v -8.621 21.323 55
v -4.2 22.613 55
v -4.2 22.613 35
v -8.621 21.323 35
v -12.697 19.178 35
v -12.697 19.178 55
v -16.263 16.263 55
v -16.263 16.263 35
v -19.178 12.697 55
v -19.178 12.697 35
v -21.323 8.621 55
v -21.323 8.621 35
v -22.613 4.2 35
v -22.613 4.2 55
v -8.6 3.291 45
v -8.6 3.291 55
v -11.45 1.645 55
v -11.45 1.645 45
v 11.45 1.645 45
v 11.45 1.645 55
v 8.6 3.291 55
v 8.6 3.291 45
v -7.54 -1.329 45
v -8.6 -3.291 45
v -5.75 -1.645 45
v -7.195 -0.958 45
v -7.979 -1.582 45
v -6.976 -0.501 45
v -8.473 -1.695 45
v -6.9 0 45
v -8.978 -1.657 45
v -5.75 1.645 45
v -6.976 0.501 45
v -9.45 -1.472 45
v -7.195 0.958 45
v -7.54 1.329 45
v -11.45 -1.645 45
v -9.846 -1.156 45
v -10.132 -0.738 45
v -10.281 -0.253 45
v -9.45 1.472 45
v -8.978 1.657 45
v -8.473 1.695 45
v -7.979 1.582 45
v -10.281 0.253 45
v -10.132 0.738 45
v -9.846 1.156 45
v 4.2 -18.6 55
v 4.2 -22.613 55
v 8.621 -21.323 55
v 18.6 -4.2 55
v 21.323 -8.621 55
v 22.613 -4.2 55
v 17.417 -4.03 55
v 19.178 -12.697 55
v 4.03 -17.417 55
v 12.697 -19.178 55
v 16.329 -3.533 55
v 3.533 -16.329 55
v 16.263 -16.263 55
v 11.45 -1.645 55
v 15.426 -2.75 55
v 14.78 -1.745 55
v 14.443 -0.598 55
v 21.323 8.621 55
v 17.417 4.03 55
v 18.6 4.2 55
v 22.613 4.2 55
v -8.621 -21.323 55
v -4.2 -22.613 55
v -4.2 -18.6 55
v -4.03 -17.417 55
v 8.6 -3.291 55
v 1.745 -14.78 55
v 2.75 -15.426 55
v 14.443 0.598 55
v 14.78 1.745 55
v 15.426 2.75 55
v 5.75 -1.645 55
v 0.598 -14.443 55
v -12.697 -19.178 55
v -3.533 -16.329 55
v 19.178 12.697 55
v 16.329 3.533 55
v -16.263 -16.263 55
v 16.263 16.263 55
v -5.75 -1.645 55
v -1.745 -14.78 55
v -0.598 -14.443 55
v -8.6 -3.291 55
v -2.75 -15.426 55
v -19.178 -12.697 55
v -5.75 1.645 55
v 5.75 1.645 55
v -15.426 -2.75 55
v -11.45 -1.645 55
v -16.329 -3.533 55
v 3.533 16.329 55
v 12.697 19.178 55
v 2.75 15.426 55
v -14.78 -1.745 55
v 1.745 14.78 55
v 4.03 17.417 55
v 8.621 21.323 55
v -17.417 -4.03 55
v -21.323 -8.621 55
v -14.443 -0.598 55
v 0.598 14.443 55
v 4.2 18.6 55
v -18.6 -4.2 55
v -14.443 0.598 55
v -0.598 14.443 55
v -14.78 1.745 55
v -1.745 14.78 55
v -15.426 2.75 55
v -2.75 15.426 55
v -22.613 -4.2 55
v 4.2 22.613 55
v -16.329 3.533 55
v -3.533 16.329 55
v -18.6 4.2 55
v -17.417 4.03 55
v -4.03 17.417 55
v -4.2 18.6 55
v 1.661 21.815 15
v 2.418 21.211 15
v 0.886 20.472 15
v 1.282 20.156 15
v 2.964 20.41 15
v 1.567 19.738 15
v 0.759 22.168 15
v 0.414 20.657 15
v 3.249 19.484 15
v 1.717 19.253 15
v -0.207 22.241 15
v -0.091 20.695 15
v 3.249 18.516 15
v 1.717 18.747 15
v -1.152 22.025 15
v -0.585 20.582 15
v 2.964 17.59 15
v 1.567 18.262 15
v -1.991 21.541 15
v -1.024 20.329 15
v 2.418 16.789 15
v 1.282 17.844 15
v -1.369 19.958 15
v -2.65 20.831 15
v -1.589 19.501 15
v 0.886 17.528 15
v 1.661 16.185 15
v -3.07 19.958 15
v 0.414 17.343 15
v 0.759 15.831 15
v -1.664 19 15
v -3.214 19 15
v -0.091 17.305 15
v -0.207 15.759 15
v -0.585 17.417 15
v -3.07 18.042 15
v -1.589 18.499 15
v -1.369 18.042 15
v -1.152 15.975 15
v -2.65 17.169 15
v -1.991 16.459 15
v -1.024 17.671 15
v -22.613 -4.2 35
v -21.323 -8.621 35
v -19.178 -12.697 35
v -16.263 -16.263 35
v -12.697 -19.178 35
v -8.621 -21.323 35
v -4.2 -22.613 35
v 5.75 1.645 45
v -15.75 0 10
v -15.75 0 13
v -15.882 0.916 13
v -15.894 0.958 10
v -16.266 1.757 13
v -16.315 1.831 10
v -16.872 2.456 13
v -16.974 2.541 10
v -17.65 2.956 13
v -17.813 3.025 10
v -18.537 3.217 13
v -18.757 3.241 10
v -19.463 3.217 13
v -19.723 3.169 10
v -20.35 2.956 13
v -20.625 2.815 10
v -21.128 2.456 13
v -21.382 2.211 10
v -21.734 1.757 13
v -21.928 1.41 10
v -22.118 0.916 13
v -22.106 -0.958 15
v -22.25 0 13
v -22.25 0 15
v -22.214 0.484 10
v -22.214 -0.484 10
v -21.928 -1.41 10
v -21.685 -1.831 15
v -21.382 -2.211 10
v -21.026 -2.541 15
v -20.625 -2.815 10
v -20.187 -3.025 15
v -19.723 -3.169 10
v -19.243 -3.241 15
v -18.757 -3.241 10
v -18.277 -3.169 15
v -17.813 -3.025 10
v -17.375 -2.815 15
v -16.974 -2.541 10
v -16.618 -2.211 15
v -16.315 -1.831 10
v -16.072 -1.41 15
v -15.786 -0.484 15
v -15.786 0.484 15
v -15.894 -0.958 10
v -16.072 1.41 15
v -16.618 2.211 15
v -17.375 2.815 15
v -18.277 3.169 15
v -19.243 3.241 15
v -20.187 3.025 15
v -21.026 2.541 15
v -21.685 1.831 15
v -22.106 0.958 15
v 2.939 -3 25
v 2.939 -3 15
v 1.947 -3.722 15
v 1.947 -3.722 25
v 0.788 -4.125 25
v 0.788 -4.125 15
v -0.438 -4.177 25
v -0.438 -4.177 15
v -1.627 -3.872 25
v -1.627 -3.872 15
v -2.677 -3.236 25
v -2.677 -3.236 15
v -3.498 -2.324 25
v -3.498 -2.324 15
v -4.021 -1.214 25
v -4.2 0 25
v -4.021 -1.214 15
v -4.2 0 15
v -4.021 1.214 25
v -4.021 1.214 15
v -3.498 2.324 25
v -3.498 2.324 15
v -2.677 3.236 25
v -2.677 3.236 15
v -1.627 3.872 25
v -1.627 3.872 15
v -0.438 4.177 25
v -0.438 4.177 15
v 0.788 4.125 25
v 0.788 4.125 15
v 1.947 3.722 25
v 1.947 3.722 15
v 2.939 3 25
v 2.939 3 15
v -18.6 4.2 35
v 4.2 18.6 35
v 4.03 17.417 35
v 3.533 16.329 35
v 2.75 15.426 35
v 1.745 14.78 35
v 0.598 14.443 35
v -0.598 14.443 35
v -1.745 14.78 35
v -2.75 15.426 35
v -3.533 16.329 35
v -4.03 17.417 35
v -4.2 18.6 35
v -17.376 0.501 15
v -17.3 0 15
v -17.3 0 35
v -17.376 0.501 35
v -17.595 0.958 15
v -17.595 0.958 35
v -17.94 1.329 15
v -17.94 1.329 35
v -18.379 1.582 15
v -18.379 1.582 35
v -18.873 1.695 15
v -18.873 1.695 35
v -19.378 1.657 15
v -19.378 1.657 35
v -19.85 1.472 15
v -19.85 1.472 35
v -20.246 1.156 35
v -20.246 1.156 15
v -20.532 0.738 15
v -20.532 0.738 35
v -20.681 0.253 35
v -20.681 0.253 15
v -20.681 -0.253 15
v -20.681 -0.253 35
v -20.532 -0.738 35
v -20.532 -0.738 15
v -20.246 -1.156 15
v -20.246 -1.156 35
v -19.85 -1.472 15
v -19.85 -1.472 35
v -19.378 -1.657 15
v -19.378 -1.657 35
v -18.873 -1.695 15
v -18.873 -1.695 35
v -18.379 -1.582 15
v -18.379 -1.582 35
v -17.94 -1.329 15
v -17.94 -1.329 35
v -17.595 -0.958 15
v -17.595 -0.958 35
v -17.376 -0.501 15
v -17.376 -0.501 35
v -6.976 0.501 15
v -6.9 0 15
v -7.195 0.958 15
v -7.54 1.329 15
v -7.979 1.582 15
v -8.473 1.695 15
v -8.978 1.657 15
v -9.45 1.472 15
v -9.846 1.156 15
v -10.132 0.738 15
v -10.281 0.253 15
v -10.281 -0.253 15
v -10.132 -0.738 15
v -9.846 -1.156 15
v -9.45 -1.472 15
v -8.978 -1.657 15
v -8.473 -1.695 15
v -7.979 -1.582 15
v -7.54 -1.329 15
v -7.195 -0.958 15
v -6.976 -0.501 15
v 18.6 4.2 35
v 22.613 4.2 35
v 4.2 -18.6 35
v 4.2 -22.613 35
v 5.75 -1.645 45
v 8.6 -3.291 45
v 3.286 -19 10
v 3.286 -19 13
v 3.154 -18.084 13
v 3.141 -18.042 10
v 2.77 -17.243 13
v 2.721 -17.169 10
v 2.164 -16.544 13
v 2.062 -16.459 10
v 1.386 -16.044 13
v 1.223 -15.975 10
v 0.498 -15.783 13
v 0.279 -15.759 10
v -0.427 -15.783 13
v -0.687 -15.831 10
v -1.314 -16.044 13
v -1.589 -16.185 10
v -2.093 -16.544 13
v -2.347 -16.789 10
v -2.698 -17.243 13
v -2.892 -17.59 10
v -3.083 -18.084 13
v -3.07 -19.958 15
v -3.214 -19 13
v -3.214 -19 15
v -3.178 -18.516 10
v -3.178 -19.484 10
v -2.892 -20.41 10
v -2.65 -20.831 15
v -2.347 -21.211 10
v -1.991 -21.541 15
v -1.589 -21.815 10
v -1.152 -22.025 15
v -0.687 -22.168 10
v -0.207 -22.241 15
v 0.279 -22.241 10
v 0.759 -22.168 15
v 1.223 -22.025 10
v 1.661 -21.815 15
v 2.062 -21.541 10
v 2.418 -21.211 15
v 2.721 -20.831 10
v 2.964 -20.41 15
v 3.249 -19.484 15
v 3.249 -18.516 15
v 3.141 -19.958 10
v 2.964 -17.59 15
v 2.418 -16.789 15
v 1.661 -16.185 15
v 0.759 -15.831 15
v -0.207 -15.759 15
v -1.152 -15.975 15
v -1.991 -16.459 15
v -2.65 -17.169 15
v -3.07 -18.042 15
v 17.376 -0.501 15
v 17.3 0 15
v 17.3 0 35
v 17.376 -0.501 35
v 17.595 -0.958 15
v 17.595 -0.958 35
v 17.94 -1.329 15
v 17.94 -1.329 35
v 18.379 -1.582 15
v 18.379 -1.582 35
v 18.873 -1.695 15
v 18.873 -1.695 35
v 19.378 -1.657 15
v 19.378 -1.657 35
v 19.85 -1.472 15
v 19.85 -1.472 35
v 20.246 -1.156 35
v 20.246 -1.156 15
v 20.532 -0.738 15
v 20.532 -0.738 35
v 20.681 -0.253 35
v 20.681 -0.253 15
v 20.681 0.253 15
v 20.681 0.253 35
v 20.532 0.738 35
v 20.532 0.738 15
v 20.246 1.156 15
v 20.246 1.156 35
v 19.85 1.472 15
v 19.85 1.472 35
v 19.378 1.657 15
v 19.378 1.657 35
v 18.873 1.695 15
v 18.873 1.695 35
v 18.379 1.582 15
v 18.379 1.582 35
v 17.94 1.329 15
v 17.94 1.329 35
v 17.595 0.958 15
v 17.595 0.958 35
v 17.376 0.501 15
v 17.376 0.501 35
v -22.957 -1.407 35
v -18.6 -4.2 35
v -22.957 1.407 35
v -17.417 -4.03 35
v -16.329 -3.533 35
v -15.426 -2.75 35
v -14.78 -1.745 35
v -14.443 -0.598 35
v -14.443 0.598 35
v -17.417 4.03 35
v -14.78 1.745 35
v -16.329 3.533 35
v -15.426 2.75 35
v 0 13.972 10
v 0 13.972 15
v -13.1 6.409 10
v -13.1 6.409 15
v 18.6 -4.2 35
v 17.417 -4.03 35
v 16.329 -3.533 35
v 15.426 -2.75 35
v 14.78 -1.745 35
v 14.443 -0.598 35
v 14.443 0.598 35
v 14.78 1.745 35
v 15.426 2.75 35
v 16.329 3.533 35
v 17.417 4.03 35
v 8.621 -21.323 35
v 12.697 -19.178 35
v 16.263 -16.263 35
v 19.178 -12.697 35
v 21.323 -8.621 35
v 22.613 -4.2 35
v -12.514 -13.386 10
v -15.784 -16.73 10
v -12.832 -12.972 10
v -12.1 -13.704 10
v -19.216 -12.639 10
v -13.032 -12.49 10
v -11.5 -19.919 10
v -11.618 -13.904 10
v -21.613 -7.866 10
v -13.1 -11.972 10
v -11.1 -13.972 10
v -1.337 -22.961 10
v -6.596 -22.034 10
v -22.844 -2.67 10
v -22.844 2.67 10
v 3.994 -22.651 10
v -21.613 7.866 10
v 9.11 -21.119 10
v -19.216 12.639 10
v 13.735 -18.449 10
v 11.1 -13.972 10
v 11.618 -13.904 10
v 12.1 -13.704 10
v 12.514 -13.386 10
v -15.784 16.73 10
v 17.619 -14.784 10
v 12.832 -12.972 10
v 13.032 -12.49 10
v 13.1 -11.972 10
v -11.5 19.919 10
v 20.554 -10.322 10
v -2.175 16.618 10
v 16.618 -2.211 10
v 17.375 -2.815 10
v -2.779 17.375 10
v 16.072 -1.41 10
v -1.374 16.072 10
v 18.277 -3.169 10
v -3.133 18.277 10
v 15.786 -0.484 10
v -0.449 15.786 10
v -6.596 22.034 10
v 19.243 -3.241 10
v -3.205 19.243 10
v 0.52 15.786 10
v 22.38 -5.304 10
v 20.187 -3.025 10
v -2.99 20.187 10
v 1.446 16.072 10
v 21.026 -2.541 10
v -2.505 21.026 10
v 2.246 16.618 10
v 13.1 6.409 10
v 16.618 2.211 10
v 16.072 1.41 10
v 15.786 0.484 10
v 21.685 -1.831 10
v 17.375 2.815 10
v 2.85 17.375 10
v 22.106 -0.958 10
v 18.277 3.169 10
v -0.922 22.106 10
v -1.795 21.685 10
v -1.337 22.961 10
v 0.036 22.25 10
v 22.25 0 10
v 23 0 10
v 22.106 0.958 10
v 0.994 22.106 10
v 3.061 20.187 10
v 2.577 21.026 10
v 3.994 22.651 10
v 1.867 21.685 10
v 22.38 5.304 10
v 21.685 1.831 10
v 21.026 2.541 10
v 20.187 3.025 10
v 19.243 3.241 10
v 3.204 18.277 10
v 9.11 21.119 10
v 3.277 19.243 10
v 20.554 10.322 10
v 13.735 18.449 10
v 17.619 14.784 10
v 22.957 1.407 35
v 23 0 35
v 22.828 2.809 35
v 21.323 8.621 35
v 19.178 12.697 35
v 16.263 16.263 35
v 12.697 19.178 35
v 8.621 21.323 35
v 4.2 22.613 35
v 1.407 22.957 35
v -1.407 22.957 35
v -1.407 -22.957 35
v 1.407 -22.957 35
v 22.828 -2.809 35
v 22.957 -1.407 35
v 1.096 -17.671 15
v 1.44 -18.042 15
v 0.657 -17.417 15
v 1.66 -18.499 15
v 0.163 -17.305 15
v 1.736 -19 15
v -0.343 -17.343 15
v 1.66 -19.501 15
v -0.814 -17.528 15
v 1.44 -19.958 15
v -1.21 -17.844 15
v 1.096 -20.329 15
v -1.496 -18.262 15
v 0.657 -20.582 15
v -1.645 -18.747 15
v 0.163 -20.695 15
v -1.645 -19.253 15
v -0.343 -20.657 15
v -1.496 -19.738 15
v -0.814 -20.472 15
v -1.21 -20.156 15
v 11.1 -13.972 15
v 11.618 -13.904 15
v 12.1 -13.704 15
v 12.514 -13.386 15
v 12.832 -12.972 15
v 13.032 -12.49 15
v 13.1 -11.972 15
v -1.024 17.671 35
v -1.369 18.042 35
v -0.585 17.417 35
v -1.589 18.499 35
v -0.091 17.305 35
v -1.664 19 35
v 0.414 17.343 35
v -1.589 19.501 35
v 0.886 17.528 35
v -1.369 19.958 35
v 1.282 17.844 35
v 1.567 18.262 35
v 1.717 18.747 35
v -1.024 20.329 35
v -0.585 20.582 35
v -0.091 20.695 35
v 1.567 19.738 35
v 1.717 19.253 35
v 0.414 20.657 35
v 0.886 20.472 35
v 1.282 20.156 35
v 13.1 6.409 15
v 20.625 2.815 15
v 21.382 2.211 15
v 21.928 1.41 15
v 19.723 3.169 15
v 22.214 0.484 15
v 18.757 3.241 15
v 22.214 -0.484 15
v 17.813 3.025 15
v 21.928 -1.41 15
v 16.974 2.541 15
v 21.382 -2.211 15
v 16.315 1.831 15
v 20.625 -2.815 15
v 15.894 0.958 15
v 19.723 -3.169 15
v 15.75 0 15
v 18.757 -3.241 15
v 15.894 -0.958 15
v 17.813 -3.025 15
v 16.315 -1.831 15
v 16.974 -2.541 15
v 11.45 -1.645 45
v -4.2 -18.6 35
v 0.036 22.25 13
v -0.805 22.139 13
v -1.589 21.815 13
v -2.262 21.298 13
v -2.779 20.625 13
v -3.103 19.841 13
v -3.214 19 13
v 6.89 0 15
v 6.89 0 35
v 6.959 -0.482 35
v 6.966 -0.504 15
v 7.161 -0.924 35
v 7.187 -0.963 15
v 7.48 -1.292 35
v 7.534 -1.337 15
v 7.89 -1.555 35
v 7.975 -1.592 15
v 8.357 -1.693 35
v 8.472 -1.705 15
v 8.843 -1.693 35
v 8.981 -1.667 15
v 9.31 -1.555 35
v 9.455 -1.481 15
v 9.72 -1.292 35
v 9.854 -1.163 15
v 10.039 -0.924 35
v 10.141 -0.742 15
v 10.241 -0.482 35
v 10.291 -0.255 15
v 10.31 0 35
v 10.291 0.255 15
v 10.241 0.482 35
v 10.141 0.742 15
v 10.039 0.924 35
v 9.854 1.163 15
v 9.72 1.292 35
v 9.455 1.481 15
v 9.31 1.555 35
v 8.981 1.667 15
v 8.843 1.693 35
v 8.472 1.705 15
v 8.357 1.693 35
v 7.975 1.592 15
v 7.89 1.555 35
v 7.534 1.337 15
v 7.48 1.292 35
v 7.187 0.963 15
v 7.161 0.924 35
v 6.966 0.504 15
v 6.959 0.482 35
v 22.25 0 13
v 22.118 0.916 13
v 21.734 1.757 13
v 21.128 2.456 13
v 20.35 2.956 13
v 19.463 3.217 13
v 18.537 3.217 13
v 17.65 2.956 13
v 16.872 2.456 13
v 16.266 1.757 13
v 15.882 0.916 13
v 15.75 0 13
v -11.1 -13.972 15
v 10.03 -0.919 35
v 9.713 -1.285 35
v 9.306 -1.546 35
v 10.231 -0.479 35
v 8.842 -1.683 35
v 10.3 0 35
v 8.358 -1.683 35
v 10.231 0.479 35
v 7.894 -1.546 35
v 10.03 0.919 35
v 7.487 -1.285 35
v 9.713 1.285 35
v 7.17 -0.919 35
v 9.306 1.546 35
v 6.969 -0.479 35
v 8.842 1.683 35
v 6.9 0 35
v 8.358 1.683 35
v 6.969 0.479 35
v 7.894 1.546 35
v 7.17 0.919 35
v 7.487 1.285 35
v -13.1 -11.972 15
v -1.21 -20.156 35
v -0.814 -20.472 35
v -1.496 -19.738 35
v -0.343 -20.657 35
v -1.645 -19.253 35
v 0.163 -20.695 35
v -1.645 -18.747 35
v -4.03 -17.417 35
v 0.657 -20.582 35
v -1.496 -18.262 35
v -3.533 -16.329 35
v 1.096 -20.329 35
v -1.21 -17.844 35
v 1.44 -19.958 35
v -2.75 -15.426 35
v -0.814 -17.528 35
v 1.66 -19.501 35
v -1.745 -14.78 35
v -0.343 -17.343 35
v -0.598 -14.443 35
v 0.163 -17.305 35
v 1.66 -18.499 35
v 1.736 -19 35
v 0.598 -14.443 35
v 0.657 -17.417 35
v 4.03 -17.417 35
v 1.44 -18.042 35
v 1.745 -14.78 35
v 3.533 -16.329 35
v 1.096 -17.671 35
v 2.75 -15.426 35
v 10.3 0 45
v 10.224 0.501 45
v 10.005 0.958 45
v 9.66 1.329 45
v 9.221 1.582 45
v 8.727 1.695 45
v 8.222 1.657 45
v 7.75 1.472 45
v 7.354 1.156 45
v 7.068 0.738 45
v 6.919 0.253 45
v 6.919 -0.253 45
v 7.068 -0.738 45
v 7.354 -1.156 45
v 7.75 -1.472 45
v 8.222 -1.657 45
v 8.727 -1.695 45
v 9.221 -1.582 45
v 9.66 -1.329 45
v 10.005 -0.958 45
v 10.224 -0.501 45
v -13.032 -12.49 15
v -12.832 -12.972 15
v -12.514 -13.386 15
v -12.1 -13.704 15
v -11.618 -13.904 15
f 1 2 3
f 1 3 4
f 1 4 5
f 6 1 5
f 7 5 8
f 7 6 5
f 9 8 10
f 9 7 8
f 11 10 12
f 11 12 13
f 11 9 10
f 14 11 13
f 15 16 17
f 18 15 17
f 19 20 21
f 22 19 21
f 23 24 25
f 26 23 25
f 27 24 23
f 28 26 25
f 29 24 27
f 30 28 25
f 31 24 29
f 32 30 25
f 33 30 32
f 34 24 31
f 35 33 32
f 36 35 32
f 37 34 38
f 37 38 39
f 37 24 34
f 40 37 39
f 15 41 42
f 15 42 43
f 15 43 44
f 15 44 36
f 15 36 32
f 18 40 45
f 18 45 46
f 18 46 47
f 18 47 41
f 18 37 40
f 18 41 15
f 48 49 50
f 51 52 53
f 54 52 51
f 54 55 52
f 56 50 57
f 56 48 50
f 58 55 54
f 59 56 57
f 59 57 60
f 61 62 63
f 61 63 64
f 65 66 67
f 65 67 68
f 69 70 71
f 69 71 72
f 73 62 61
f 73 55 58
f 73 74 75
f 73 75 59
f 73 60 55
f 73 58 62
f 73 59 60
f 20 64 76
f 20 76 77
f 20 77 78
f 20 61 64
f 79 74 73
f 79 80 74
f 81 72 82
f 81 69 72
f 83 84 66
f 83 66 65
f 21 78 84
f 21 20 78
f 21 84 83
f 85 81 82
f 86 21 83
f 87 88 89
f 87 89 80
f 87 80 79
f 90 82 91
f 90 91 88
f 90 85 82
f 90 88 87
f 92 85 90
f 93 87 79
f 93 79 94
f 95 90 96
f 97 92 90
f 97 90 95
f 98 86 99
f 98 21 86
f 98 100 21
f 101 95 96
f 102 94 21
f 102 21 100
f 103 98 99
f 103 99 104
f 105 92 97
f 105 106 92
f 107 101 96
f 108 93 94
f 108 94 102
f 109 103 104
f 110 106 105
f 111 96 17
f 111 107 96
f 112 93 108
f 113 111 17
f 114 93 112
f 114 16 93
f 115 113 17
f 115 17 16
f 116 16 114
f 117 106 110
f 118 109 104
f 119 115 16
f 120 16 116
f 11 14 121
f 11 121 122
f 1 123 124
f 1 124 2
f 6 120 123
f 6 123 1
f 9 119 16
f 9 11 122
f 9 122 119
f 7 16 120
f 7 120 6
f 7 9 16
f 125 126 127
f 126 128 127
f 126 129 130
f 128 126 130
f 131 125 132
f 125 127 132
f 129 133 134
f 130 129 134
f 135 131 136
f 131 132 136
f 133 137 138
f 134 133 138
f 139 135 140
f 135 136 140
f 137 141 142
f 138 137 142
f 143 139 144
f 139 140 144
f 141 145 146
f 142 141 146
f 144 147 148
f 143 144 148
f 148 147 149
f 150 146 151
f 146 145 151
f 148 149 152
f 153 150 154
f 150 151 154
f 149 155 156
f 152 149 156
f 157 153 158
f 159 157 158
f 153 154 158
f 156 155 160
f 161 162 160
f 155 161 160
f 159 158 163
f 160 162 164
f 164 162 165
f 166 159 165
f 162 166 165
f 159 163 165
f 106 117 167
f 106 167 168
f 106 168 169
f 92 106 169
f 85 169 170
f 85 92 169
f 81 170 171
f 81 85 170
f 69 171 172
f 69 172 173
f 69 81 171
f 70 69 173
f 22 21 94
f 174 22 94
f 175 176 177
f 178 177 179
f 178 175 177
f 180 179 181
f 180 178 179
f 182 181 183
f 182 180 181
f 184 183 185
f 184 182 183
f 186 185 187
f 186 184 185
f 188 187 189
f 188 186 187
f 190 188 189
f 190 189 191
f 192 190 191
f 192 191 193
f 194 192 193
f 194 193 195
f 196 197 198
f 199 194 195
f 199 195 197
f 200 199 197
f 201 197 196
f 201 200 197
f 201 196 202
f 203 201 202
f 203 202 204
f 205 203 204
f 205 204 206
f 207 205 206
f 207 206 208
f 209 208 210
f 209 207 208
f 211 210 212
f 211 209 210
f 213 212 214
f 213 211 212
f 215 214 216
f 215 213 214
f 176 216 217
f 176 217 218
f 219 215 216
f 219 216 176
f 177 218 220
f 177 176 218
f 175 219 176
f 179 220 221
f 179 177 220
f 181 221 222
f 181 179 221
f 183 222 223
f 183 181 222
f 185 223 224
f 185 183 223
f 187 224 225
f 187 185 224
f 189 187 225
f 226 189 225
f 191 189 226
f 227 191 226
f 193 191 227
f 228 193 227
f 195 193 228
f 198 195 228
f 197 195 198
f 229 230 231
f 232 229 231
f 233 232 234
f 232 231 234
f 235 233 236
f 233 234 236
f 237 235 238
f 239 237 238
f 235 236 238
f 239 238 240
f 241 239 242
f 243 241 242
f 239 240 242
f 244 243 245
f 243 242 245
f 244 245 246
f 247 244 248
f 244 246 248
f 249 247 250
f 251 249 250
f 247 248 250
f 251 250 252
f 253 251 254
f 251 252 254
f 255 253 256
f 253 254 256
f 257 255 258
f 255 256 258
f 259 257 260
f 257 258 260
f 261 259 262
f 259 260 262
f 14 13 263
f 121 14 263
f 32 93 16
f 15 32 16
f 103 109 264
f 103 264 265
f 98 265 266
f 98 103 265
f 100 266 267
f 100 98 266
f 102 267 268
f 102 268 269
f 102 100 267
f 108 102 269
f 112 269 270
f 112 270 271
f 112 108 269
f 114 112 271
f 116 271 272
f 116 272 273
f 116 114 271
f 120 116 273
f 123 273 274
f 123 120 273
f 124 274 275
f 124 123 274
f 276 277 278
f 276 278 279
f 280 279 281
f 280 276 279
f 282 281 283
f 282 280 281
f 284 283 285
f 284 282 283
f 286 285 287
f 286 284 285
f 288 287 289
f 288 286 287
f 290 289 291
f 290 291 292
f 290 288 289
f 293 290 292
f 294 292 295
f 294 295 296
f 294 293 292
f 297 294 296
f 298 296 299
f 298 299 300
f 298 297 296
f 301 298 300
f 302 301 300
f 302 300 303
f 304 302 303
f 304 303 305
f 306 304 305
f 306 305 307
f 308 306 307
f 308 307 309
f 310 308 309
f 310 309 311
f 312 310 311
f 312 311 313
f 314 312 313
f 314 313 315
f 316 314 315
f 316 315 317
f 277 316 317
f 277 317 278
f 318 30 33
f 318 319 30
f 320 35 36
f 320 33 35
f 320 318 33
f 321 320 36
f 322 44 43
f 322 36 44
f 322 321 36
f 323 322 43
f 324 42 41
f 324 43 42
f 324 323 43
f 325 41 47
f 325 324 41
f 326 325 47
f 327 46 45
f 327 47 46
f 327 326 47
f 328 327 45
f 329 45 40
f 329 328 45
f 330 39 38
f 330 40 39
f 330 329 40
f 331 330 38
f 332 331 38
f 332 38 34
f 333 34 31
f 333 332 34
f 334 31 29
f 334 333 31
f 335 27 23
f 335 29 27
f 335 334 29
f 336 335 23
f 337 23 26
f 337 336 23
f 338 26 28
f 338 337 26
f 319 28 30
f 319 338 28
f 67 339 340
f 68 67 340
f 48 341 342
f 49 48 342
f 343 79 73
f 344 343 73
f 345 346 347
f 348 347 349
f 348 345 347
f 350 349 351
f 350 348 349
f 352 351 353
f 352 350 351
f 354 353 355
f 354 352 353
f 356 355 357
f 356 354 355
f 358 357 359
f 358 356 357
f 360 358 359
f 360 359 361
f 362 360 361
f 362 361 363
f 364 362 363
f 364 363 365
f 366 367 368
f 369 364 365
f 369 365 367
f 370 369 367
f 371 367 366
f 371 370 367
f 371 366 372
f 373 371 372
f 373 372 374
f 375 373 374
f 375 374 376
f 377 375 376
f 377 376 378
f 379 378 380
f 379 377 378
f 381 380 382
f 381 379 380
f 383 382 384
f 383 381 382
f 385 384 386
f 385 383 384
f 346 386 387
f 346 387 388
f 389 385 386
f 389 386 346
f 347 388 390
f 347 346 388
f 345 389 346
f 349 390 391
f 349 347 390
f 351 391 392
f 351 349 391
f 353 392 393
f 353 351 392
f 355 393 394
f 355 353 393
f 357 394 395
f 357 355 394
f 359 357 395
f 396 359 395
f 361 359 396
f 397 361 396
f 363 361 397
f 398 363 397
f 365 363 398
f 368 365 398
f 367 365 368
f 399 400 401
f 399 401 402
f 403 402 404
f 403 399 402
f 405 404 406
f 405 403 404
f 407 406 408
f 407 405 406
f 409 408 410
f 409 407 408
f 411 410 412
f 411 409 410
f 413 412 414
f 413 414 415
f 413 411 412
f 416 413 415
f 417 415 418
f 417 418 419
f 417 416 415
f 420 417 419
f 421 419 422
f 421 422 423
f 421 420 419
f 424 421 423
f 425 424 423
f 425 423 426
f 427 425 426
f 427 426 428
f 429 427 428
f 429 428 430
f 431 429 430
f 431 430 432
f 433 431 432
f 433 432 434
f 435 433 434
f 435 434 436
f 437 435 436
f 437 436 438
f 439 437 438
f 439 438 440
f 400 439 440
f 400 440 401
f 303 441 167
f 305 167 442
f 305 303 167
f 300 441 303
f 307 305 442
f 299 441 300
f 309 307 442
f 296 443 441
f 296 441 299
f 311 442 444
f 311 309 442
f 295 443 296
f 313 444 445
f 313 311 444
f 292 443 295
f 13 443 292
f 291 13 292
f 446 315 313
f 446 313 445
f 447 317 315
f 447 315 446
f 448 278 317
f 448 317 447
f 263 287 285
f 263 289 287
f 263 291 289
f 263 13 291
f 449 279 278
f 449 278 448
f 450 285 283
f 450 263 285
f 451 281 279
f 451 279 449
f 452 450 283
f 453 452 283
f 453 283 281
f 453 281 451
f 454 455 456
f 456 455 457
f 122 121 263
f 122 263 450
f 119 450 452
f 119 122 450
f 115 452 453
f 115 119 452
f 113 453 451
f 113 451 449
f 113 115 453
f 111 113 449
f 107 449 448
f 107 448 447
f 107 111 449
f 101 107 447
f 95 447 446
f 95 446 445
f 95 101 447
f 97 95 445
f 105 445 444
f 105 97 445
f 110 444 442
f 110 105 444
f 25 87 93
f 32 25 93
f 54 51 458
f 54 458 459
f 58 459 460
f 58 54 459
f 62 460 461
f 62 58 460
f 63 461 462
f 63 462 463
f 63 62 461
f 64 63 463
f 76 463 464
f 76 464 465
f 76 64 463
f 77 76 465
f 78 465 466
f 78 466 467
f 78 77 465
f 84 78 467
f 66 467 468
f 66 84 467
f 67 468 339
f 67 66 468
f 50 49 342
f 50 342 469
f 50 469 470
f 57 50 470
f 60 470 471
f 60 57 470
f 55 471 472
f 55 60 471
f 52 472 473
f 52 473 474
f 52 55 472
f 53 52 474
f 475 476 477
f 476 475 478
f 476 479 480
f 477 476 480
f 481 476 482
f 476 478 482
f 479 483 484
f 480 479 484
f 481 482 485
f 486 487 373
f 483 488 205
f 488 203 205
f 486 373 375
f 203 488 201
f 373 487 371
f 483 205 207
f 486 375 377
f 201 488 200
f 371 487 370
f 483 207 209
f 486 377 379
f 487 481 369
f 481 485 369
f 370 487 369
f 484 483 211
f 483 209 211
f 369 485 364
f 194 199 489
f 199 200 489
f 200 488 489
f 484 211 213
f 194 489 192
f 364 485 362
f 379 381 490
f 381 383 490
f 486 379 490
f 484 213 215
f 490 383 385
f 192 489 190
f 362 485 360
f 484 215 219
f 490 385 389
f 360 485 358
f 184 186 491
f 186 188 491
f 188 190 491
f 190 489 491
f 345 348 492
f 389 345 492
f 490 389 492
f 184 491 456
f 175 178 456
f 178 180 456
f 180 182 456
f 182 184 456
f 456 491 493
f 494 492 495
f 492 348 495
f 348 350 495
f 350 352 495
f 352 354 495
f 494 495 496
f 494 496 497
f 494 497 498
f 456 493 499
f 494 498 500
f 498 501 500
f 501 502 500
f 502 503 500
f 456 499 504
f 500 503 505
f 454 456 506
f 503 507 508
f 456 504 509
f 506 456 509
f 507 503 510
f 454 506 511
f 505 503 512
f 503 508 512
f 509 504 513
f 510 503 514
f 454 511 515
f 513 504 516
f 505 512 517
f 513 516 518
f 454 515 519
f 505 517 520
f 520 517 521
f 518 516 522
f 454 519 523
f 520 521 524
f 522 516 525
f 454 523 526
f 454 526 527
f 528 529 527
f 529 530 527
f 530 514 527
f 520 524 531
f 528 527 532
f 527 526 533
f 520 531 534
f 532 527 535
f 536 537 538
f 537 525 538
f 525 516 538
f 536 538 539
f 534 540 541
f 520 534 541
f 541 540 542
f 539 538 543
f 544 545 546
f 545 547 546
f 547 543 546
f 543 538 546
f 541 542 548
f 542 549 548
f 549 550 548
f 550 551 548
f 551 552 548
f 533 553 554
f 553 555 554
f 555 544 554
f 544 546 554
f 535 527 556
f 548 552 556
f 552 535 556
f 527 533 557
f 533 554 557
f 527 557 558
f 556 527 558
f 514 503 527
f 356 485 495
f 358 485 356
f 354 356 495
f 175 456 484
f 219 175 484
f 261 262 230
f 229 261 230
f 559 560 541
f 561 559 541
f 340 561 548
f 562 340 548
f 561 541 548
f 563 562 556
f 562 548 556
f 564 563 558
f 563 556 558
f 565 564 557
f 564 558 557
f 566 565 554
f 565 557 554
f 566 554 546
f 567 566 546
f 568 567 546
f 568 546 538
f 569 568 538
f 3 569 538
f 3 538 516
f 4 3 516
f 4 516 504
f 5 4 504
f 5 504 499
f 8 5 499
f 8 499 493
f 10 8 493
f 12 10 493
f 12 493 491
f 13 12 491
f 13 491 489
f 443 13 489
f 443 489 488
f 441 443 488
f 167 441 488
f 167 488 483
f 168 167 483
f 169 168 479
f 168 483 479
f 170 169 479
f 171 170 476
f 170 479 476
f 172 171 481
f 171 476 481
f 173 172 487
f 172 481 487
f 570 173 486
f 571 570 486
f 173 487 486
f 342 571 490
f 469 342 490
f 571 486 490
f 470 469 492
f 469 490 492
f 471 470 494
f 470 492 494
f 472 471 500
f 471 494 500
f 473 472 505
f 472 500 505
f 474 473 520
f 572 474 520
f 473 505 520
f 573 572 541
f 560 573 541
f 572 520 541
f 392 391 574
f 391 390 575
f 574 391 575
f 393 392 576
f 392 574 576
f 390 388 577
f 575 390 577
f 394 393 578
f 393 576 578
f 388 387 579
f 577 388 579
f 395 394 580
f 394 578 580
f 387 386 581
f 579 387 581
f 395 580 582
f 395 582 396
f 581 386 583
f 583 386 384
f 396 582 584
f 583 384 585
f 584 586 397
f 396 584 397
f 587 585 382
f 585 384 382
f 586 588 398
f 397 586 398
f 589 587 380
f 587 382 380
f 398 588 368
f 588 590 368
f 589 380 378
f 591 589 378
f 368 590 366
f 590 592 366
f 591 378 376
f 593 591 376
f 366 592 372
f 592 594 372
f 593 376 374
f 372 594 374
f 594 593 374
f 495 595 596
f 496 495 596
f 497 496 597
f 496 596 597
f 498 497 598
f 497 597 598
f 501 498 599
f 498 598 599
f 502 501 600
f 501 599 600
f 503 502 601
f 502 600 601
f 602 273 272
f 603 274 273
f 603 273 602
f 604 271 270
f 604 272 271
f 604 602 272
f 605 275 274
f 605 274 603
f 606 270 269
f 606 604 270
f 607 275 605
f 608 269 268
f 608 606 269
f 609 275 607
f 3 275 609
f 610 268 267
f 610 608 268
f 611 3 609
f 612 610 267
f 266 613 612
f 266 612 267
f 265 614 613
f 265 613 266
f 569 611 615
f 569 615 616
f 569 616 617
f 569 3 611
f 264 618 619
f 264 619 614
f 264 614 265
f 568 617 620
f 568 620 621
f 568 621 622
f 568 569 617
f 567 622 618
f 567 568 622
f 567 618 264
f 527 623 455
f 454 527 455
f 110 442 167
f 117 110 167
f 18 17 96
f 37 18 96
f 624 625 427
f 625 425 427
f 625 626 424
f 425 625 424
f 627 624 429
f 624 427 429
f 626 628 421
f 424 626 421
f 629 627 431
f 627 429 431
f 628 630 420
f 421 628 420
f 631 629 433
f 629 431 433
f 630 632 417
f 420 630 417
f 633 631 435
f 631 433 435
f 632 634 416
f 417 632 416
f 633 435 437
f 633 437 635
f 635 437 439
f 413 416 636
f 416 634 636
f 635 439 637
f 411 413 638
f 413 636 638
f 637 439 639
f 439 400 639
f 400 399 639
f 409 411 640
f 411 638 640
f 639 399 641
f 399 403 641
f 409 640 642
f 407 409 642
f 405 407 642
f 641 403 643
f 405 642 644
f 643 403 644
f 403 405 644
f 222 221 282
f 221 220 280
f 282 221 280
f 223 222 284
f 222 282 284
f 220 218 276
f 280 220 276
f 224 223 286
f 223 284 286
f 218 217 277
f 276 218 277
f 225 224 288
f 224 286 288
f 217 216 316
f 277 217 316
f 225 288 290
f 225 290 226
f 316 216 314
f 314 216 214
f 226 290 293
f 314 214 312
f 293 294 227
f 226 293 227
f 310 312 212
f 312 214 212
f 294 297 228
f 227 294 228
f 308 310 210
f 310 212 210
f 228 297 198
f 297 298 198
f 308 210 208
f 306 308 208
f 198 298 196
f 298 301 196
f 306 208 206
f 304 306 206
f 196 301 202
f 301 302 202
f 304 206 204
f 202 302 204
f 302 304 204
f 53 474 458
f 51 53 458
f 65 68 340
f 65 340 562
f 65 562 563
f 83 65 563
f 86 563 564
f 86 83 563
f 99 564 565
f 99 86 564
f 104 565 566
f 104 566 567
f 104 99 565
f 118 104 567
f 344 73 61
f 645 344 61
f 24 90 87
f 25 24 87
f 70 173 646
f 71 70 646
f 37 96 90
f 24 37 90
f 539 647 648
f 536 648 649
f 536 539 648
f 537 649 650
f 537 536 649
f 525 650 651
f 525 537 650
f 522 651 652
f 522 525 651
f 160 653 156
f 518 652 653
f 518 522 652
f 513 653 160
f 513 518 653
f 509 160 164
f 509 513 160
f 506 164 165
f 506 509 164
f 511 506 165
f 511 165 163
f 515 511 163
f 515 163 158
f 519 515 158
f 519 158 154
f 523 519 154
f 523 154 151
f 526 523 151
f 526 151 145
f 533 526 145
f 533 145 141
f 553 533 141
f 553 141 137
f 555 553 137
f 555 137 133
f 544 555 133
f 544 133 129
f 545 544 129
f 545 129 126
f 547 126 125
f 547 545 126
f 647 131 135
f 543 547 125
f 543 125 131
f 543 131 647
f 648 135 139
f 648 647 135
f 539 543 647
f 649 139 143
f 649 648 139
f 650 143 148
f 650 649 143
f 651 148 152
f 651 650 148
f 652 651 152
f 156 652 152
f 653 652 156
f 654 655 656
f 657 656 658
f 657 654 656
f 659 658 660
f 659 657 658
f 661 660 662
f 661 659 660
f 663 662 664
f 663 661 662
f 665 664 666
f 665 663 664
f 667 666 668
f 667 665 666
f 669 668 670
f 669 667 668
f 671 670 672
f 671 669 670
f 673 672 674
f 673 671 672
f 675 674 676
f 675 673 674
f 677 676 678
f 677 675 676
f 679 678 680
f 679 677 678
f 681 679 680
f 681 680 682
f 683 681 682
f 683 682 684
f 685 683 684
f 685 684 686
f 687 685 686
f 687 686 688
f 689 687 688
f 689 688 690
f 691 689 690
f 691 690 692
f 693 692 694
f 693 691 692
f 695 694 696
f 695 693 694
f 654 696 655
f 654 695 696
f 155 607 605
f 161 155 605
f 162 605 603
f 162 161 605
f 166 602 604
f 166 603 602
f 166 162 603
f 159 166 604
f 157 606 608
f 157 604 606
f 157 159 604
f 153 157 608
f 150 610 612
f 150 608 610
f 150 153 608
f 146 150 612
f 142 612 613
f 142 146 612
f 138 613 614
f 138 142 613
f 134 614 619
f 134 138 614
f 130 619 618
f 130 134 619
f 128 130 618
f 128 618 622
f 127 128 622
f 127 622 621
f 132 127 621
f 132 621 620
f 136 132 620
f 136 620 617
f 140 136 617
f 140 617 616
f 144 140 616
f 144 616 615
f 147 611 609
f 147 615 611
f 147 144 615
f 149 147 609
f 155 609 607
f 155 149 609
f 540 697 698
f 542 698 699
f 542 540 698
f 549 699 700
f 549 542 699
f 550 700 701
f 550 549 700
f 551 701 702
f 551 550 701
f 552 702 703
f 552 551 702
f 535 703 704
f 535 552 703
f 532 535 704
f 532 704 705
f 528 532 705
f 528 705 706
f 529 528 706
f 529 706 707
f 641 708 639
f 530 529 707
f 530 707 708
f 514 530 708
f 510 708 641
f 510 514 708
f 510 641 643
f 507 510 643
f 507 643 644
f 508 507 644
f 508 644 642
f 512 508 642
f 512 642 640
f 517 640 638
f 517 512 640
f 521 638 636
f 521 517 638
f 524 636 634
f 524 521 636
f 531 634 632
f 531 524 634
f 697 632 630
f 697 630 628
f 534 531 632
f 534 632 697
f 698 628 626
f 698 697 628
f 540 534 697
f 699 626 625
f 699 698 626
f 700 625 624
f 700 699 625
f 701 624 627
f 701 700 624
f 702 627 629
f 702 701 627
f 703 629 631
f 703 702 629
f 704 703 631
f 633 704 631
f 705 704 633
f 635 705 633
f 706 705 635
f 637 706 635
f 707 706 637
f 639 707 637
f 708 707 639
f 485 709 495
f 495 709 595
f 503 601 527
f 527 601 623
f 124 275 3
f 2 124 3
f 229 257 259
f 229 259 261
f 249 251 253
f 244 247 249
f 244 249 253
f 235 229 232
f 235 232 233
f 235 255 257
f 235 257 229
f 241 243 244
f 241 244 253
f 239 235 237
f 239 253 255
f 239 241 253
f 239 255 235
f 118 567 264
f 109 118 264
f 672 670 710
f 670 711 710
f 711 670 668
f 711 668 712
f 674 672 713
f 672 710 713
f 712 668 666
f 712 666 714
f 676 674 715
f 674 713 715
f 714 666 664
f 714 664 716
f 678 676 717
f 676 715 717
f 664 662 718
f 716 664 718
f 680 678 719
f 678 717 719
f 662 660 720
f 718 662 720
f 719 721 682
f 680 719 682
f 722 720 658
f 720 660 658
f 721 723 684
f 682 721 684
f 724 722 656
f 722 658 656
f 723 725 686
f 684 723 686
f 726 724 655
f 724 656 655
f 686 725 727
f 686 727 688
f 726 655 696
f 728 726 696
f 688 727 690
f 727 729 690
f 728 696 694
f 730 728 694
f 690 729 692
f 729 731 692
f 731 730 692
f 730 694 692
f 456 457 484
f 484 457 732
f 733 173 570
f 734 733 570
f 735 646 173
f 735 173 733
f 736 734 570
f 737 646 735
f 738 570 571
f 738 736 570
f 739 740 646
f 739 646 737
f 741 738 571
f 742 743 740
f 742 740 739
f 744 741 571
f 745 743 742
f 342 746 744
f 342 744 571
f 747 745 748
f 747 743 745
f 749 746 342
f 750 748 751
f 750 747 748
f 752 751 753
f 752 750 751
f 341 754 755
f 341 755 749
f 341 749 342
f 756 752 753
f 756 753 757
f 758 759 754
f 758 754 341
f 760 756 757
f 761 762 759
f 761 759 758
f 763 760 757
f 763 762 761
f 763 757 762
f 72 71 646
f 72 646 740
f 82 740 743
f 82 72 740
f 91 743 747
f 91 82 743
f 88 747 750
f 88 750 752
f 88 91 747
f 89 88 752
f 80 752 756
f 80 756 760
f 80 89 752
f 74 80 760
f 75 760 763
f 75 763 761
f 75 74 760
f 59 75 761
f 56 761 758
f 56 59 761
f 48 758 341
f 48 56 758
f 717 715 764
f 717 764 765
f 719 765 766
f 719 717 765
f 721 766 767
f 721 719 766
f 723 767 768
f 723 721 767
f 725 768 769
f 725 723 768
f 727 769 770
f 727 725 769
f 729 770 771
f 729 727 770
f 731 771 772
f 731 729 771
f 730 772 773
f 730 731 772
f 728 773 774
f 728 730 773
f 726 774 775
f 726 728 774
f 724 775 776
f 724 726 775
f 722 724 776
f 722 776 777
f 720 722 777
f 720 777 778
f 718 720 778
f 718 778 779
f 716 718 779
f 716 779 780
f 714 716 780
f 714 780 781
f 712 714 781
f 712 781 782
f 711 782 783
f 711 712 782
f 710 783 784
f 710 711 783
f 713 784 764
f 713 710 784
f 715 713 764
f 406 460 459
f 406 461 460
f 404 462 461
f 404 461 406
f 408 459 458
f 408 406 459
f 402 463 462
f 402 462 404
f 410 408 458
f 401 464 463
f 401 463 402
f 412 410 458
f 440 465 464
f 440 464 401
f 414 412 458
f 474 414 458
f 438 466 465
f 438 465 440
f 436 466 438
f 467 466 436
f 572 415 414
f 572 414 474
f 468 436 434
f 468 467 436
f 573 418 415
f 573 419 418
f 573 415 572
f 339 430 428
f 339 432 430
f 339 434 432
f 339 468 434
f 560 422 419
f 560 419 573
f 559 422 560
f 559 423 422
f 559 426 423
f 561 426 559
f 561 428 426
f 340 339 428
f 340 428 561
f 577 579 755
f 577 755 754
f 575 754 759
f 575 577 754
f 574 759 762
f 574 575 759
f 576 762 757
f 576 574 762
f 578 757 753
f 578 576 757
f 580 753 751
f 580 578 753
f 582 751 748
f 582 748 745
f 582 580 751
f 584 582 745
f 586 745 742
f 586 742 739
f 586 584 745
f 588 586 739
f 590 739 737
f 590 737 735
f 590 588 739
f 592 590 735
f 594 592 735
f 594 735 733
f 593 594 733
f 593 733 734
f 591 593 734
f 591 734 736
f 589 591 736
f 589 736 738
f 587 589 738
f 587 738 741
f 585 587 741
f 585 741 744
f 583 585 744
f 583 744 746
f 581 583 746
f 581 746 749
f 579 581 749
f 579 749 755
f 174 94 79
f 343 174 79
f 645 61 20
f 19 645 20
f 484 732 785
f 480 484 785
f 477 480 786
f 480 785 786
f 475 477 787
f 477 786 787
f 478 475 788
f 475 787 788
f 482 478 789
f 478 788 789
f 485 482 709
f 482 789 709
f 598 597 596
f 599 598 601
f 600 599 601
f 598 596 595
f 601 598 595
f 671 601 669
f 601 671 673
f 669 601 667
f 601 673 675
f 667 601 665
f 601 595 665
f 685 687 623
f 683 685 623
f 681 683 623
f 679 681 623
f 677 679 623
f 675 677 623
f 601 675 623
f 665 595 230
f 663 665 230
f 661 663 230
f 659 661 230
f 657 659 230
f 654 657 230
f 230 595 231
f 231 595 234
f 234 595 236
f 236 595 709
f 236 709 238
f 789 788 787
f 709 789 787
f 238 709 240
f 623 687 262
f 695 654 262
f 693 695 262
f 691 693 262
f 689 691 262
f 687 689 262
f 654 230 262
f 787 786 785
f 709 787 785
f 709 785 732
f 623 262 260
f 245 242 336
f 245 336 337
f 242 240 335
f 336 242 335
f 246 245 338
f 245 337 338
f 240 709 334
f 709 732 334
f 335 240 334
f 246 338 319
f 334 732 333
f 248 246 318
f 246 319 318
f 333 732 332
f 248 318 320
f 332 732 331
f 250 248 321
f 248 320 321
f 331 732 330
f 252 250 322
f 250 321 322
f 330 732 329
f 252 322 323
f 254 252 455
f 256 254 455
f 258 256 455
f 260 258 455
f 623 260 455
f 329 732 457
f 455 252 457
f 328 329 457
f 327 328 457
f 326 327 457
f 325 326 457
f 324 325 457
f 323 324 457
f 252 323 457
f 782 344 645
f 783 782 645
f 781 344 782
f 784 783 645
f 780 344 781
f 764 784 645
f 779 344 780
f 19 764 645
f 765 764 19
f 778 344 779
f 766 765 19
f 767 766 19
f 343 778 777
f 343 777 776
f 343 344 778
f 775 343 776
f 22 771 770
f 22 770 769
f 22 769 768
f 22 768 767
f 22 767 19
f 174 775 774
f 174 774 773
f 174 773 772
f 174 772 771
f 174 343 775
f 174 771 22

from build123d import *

# Parameters (mm, degrees)
BOSS_EXTRUDE1_OUTLINE_R    = 16
BOSS_EXTRUDE1_DEPTH        = 15
SKETCH2_W                  = 7.4
SKETCH2_H                  = 24.742483552
CUT_EXTRUDE1_DEPTH         = 16.8
SKETCH3_R                  = 1.71
CUT_EXTRUDE2_DEPTH         = 70
BOSS_EXTRUDE2_DEPTH        = 20
BOSS_EXTRUDE2_DEPTH_BACK   = 5
SKETCH10_R                 = 23
SKETCH10_R_2               = 1.7
CUT_EXTRUDE4_DEPTH         = 25
SKETCH3_11_R               = 1.71
CUT_EXTRUDE5_DEPTH         = 55
CUT_EXTRUDE6_DEPTH         = 2.3
CUT_EXTRUDE6_DEPTH_BACK    = 0.7
SKETCH14_R                 = 12.3
BOSS_EXTRUDE3_START        = 20
BOSS_EXTRUDE3_DEPTH        = 20
SKETCH19_R                 = 16.2
CUT_EXTRUDE7_DEPTH         = 2.2
CUT_EXTRUDE8_START         = 35
CUT_EXTRUDE8_OUTLINE_R     = 1.7
CUT_EXTRUDE8_DEPTH         = 20
CUT_EXTRUDE9_START         = 2
CUT_EXTRUDE9_OUTLINE_R     = 16
CUT_EXTRUDE9_OUTLINE_R_2   = 15.484452344
CUT_EXTRUDE9_DEPTH         = 8
CUT_EXTRUDE9_START_2       = 10
CUT_EXTRUDE9_2_OUTLINE_R   = 3.25
CUT_EXTRUDE9_2_OUTLINE_R_2 = 1.7
CUT_EXTRUDE9_2_DEPTH       = 3
CUT_EXTRUDE10_DEPTH        = 3.6
SKETCH36_R                 = 15.484452344
CUT_EXTRUDE11_DEPTH        = 8
CUT_EXTRUDE13_DEPTH        = 5
CUT_EXTRUDE14_DEPTH        = 10
SKETCH39_R                 = 3.25
CUT_EXTRUDE15_DEPTH        = 5


# Read off the part's stored shape, not the designer's step: Boss-Extrude1, Cut-Extrude8, Cut-Extrude9
with BuildPart() as part:
    # Boss-Extrude1 outline → Boss-Extrude1 (new body)
    with BuildSketch(Plane(origin=(0, 0, 0), x_dir=(0, 1, 0), z_dir=(0, 0, 1))):
        Circle(BOSS_EXTRUDE1_OUTLINE_R)
    extrude(amount=BOSS_EXTRUDE1_DEPTH)

    # Sketch2 → Cut-Extrude1 (cut)
    with BuildSketch(Plane.ZY.offset(16)):
        with Locations((10.1, 0)):
            Rectangle(SKETCH2_W, SKETCH2_H)
    extrude(amount=-CUT_EXTRUDE1_DEPTH, mode=Mode.SUBTRACT)

    # Sketch3 → Cut-Extrude2 (cut)
    with BuildSketch(Plane(origin=(0, 0, 0), x_dir=(0, 1, 0), z_dir=(0, 0, 1))):
        with Locations((0, 8.6)):
            Circle(SKETCH3_R)
    extrude(amount=CUT_EXTRUDE2_DEPTH, mode=Mode.SUBTRACT)

    # Sketch10 → Boss-Extrude2 (add, two sides: drawn at the far end of the back side and taken through both)
    with BuildSketch(Plane(origin=(0, 0, 15), x_dir=(0, 1, 0), z_dir=(0, 0, 1)).offset(-BOSS_EXTRUDE2_DEPTH_BACK)):
        with Locations(Location((0, 0, 0), (0, 0, 270))):
            Circle(SKETCH10_R)
        with Locations(Location((0, 8.6, 0), (0, 0, 270))):
            Circle(SKETCH10_R_2, mode=Mode.SUBTRACT)
        with Locations(Location((0, 19, 0), (0, 0, 270))):
            Circle(SKETCH10_R_2, mode=Mode.SUBTRACT)
        with Locations(Location((18.999966339, -0.035764812, 0), (0, 0, 90))):
            Circle(SKETCH10_R_2, mode=Mode.SUBTRACT)
        with Locations(Location((0, -19, 0), (0, 0, 90))):
            Circle(SKETCH10_R_2, mode=Mode.SUBTRACT)
        with Locations(Location((-18.999966339, -0.035764812, 0), (0, 0, 270))):
            Circle(SKETCH10_R_2, mode=Mode.SUBTRACT)
        with Locations(Location((0, -8.6, 0), (0, 0, 270))):
            Circle(SKETCH10_R_2, mode=Mode.SUBTRACT)
    extrude(amount=BOSS_EXTRUDE2_DEPTH + BOSS_EXTRUDE2_DEPTH_BACK)

    # Sketch3<6> → Cut-Extrude4 (cut)
    with BuildSketch(Plane(origin=(0, 0, 0), x_dir=(0, 1, 0), z_dir=(0, 0, 1))):
        with BuildLine():
            Line((3, -2.939387691), (-3, -2.939387691))
            ThreePointArc((-3, -2.939387691), (0, 4.2), (3, -2.939387691))
        make_face()
    extrude(amount=CUT_EXTRUDE4_DEPTH, mode=Mode.SUBTRACT)

    # Sketch3<11> → Cut-Extrude5 (cut)
    with BuildSketch(Plane(origin=(0, 0, 0), x_dir=(0, 1, 0), z_dir=(0, 0, 1))):
        with Locations(Location((0, -8.6, 0), (0, 0, 90))):
            Circle(SKETCH3_11_R)
    extrude(amount=CUT_EXTRUDE5_DEPTH, mode=Mode.SUBTRACT)

    # Sketch14 → Cut-Extrude6 (cut, two sides: drawn at the far end of the back side and taken through both)
    with BuildSketch(Plane(origin=(0, 0, 7.5), x_dir=(0, 1, 0), z_dir=(0, 0, 1)).offset(-CUT_EXTRUDE6_DEPTH_BACK)):
        Circle(SKETCH14_R)
    extrude(amount=CUT_EXTRUDE6_DEPTH + CUT_EXTRUDE6_DEPTH_BACK, mode=Mode.SUBTRACT)

    # Sketch15 → Boss-Extrude3 (add)
    with BuildSketch(Plane(origin=(0, 0, 35), x_dir=(0, 1, 0), z_dir=(0, 0, 1)).offset(BOSS_EXTRUDE3_START)):
        with BuildLine():
            Line((-4.2, 18.6), (-4.2, 22.61327044))
            ThreePointArc((-4.2, 22.61327044), (-16.263455967, 16.263455967), (-22.61327044, 4.2))
            Line((-22.61327044, 4.2), (-18.6, 4.2))
            ThreePointArc((-18.6, 4.2), (-14.4, 0), (-18.6, -4.2))
            Line((-18.6, -4.2), (-22.61327044, -4.2))
            ThreePointArc((-22.61327044, -4.2), (-16.263455967, -16.263455967), (-4.2, -22.61327044))
            Line((-4.2, -22.61327044), (-4.2, -18.6))
            ThreePointArc((-4.2, -18.6), (0, -14.4), (4.2, -18.6))
            Line((4.2, -18.6), (4.2, -22.61327044))
            ThreePointArc((4.2, -22.61327044), (16.263455967, -16.263455967), (22.61327044, -4.2))
            Line((22.61327044, -4.2), (18.6, -4.2))
            ThreePointArc((18.6, -4.2), (14.4, 0), (18.6, 4.2))
            Line((18.6, 4.2), (22.61327044, 4.2))
            ThreePointArc((22.61327044, 4.2), (16.263455967, 16.263455967), (4.2, 22.61327044))
            Line((4.2, 22.61327044), (4.2, 18.6))
            ThreePointArc((4.2, 18.6), (0, 14.4), (-4.2, 18.6))
        make_face()
    extrude(amount=-BOSS_EXTRUDE3_DEPTH)

    # Sketch19 → Cut-Extrude7 (cut)
    with BuildSketch(Plane.YX.offset(0.2)):
        Circle(SKETCH19_R)
    extrude(amount=-CUT_EXTRUDE7_DEPTH, mode=Mode.SUBTRACT)

    # Cut-Extrude8 outline → Cut-Extrude8 (cut)
    with BuildSketch(Plane.XY.offset(CUT_EXTRUDE8_START)):
        with Locations((-8.6, 0)):
            Circle(CUT_EXTRUDE8_OUTLINE_R)
        with Locations((8.6, 0)):
            Circle(CUT_EXTRUDE8_OUTLINE_R)
    extrude(amount=CUT_EXTRUDE8_DEPTH, mode=Mode.SUBTRACT)

    # Sketch24 → CBORE for M3 SHCS1 (revolve, cut)
    with BuildSketch(Plane(origin=(0.035764812, 18.999966339, 10), x_dir=(0, 1, 0), z_dir=(1, 0, 0))):
        Polygon((0, 0), (0, 45), (1.7, 45), (1.7, 3), (3.25, 3), (3.25, 0), align=None)
    revolve(axis=Axis((0.035764812, 18.999966339, 3.65), (0, 0, 1)), mode=Mode.SUBTRACT)

    # Cut-Extrude9 outline → Cut-Extrude9 (cut)
    with BuildSketch(Plane.XY.offset(CUT_EXTRUDE9_START)):
        Circle(CUT_EXTRUDE9_OUTLINE_R)
        Circle(CUT_EXTRUDE9_OUTLINE_R_2, mode=Mode.SUBTRACT)
    extrude(amount=CUT_EXTRUDE9_DEPTH, mode=Mode.SUBTRACT)

    # Cut-Extrude9 2 outline → Cut-Extrude9 2 (cut)
    # profile 1 of 3: a face of its own
    with BuildSketch(Plane.XY.offset(CUT_EXTRUDE9_START_2)):
        with Locations((-19, 0)):
            Circle(CUT_EXTRUDE9_2_OUTLINE_R)
        with Locations((-19, 0)):
            Circle(CUT_EXTRUDE9_2_OUTLINE_R_2, mode=Mode.SUBTRACT)
    # profile 2 of 3: a face of its own
    with BuildSketch(Plane.XY.offset(CUT_EXTRUDE9_START_2)):
        with Locations((19, 0)):
            Circle(CUT_EXTRUDE9_2_OUTLINE_R)
        with Locations((19, 0)):
            Circle(CUT_EXTRUDE9_2_OUTLINE_R_2, mode=Mode.SUBTRACT)
    # profile 3 of 3: a face of its own
    with BuildSketch(Plane.XY.offset(CUT_EXTRUDE9_START_2)):
        with Locations((0.035764812, -18.999966339)):
            Circle(CUT_EXTRUDE9_2_OUTLINE_R)
        with Locations((0.035764812, -18.999966339)):
            Circle(CUT_EXTRUDE9_2_OUTLINE_R_2, mode=Mode.SUBTRACT)
    extrude(amount=CUT_EXTRUDE9_2_DEPTH, mode=Mode.SUBTRACT)

    # Sketch31 → Cut-Extrude10 (cut)
    with BuildSketch(Plane(origin=(0, 0, 10), x_dir=(0, 1, 0), z_dir=(0, 0, 1))):
        with BuildLine():
            Line((-12.4, 0), (12.4, 0))
            ThreePointArc((12.4, 0), (0, -12.4), (-12.4, 0))
        make_face()
    extrude(amount=-CUT_EXTRUDE10_DEPTH, mode=Mode.SUBTRACT)

    # Sketch36 → Cut-Extrude11 (cut)
    with BuildSketch(Plane(origin=(0, 0, 2), x_dir=(0, 1, 0), z_dir=(0, 0, 1))):
        Circle(SKETCH36_R)
    extrude(amount=CUT_EXTRUDE11_DEPTH, mode=Mode.SUBTRACT)

    # Sketch37 → Cut-Extrude13 (cut)
    with BuildSketch(Plane(origin=(0, 0, 15), x_dir=(0, 1, 0), z_dir=(0, 0, 1))):
        with BuildLine():
            Line((6.408587988, -13.1), (13.971876514, 0))
            Line((13.971876514, 0), (6.408587988, 13.1))
            Line((6.408587988, 13.1), (-11.971876514, 13.1))
            ThreePointArc((-11.971876514, 13.1), (-13.386090077, 12.514213562), (-13.971876514, 11.1))
            Line((-13.971876514, 11.1), (-13.971876514, -11.1))
            ThreePointArc((-13.971876514, -11.1), (-13.386090077, -12.514213562), (-11.971876514, -13.1))
            Line((-11.971876514, -13.1), (6.408587988, -13.1))
        make_face()
    extrude(amount=-CUT_EXTRUDE13_DEPTH, mode=Mode.SUBTRACT)

    # Sketch38 → Cut-Extrude14 (cut)
    with BuildSketch(Plane(origin=(0, 0, 55), x_dir=(0, 1, 0), z_dir=(0, 0, 1))):
        Polygon((3.290896534, 8.6), (1.645448267, 11.45), (-1.645448267, 11.45), (-3.290896534, 8.6), (-1.645448267, 5.75), (1.645448267, 5.75), align=None)
        Polygon((3.290896534, -8.6), (1.645448267, -5.75), (-1.645448267, -5.75), (-3.290896534, -8.6), (-1.645448267, -11.45), (1.645448267, -11.45), align=None)
    extrude(amount=-CUT_EXTRUDE14_DEPTH, mode=Mode.SUBTRACT)

    # Sketch39 → Cut-Extrude15 (cut)
    with BuildSketch(Plane(origin=(0, 0, 10), x_dir=(0, 1, 0), z_dir=(0, 0, 1))):
        with Locations(Location((0, 19, 0), (0, 0, 90))):
            Circle(SKETCH39_R)
        with Locations(Location((-18.999966339, -0.035764812, 0), (0, 0, 90))):
            Circle(SKETCH39_R)
        with Locations(Location((0, -19, 0), (0, 0, 90))):
            Circle(SKETCH39_R)
        with Locations(Location((18.999966339, -0.035764812, 0), (0, 0, 90))):
            Circle(SKETCH39_R)
    extrude(amount=CUT_EXTRUDE15_DEPTH, mode=Mode.SUBTRACT)


solid = part.part
